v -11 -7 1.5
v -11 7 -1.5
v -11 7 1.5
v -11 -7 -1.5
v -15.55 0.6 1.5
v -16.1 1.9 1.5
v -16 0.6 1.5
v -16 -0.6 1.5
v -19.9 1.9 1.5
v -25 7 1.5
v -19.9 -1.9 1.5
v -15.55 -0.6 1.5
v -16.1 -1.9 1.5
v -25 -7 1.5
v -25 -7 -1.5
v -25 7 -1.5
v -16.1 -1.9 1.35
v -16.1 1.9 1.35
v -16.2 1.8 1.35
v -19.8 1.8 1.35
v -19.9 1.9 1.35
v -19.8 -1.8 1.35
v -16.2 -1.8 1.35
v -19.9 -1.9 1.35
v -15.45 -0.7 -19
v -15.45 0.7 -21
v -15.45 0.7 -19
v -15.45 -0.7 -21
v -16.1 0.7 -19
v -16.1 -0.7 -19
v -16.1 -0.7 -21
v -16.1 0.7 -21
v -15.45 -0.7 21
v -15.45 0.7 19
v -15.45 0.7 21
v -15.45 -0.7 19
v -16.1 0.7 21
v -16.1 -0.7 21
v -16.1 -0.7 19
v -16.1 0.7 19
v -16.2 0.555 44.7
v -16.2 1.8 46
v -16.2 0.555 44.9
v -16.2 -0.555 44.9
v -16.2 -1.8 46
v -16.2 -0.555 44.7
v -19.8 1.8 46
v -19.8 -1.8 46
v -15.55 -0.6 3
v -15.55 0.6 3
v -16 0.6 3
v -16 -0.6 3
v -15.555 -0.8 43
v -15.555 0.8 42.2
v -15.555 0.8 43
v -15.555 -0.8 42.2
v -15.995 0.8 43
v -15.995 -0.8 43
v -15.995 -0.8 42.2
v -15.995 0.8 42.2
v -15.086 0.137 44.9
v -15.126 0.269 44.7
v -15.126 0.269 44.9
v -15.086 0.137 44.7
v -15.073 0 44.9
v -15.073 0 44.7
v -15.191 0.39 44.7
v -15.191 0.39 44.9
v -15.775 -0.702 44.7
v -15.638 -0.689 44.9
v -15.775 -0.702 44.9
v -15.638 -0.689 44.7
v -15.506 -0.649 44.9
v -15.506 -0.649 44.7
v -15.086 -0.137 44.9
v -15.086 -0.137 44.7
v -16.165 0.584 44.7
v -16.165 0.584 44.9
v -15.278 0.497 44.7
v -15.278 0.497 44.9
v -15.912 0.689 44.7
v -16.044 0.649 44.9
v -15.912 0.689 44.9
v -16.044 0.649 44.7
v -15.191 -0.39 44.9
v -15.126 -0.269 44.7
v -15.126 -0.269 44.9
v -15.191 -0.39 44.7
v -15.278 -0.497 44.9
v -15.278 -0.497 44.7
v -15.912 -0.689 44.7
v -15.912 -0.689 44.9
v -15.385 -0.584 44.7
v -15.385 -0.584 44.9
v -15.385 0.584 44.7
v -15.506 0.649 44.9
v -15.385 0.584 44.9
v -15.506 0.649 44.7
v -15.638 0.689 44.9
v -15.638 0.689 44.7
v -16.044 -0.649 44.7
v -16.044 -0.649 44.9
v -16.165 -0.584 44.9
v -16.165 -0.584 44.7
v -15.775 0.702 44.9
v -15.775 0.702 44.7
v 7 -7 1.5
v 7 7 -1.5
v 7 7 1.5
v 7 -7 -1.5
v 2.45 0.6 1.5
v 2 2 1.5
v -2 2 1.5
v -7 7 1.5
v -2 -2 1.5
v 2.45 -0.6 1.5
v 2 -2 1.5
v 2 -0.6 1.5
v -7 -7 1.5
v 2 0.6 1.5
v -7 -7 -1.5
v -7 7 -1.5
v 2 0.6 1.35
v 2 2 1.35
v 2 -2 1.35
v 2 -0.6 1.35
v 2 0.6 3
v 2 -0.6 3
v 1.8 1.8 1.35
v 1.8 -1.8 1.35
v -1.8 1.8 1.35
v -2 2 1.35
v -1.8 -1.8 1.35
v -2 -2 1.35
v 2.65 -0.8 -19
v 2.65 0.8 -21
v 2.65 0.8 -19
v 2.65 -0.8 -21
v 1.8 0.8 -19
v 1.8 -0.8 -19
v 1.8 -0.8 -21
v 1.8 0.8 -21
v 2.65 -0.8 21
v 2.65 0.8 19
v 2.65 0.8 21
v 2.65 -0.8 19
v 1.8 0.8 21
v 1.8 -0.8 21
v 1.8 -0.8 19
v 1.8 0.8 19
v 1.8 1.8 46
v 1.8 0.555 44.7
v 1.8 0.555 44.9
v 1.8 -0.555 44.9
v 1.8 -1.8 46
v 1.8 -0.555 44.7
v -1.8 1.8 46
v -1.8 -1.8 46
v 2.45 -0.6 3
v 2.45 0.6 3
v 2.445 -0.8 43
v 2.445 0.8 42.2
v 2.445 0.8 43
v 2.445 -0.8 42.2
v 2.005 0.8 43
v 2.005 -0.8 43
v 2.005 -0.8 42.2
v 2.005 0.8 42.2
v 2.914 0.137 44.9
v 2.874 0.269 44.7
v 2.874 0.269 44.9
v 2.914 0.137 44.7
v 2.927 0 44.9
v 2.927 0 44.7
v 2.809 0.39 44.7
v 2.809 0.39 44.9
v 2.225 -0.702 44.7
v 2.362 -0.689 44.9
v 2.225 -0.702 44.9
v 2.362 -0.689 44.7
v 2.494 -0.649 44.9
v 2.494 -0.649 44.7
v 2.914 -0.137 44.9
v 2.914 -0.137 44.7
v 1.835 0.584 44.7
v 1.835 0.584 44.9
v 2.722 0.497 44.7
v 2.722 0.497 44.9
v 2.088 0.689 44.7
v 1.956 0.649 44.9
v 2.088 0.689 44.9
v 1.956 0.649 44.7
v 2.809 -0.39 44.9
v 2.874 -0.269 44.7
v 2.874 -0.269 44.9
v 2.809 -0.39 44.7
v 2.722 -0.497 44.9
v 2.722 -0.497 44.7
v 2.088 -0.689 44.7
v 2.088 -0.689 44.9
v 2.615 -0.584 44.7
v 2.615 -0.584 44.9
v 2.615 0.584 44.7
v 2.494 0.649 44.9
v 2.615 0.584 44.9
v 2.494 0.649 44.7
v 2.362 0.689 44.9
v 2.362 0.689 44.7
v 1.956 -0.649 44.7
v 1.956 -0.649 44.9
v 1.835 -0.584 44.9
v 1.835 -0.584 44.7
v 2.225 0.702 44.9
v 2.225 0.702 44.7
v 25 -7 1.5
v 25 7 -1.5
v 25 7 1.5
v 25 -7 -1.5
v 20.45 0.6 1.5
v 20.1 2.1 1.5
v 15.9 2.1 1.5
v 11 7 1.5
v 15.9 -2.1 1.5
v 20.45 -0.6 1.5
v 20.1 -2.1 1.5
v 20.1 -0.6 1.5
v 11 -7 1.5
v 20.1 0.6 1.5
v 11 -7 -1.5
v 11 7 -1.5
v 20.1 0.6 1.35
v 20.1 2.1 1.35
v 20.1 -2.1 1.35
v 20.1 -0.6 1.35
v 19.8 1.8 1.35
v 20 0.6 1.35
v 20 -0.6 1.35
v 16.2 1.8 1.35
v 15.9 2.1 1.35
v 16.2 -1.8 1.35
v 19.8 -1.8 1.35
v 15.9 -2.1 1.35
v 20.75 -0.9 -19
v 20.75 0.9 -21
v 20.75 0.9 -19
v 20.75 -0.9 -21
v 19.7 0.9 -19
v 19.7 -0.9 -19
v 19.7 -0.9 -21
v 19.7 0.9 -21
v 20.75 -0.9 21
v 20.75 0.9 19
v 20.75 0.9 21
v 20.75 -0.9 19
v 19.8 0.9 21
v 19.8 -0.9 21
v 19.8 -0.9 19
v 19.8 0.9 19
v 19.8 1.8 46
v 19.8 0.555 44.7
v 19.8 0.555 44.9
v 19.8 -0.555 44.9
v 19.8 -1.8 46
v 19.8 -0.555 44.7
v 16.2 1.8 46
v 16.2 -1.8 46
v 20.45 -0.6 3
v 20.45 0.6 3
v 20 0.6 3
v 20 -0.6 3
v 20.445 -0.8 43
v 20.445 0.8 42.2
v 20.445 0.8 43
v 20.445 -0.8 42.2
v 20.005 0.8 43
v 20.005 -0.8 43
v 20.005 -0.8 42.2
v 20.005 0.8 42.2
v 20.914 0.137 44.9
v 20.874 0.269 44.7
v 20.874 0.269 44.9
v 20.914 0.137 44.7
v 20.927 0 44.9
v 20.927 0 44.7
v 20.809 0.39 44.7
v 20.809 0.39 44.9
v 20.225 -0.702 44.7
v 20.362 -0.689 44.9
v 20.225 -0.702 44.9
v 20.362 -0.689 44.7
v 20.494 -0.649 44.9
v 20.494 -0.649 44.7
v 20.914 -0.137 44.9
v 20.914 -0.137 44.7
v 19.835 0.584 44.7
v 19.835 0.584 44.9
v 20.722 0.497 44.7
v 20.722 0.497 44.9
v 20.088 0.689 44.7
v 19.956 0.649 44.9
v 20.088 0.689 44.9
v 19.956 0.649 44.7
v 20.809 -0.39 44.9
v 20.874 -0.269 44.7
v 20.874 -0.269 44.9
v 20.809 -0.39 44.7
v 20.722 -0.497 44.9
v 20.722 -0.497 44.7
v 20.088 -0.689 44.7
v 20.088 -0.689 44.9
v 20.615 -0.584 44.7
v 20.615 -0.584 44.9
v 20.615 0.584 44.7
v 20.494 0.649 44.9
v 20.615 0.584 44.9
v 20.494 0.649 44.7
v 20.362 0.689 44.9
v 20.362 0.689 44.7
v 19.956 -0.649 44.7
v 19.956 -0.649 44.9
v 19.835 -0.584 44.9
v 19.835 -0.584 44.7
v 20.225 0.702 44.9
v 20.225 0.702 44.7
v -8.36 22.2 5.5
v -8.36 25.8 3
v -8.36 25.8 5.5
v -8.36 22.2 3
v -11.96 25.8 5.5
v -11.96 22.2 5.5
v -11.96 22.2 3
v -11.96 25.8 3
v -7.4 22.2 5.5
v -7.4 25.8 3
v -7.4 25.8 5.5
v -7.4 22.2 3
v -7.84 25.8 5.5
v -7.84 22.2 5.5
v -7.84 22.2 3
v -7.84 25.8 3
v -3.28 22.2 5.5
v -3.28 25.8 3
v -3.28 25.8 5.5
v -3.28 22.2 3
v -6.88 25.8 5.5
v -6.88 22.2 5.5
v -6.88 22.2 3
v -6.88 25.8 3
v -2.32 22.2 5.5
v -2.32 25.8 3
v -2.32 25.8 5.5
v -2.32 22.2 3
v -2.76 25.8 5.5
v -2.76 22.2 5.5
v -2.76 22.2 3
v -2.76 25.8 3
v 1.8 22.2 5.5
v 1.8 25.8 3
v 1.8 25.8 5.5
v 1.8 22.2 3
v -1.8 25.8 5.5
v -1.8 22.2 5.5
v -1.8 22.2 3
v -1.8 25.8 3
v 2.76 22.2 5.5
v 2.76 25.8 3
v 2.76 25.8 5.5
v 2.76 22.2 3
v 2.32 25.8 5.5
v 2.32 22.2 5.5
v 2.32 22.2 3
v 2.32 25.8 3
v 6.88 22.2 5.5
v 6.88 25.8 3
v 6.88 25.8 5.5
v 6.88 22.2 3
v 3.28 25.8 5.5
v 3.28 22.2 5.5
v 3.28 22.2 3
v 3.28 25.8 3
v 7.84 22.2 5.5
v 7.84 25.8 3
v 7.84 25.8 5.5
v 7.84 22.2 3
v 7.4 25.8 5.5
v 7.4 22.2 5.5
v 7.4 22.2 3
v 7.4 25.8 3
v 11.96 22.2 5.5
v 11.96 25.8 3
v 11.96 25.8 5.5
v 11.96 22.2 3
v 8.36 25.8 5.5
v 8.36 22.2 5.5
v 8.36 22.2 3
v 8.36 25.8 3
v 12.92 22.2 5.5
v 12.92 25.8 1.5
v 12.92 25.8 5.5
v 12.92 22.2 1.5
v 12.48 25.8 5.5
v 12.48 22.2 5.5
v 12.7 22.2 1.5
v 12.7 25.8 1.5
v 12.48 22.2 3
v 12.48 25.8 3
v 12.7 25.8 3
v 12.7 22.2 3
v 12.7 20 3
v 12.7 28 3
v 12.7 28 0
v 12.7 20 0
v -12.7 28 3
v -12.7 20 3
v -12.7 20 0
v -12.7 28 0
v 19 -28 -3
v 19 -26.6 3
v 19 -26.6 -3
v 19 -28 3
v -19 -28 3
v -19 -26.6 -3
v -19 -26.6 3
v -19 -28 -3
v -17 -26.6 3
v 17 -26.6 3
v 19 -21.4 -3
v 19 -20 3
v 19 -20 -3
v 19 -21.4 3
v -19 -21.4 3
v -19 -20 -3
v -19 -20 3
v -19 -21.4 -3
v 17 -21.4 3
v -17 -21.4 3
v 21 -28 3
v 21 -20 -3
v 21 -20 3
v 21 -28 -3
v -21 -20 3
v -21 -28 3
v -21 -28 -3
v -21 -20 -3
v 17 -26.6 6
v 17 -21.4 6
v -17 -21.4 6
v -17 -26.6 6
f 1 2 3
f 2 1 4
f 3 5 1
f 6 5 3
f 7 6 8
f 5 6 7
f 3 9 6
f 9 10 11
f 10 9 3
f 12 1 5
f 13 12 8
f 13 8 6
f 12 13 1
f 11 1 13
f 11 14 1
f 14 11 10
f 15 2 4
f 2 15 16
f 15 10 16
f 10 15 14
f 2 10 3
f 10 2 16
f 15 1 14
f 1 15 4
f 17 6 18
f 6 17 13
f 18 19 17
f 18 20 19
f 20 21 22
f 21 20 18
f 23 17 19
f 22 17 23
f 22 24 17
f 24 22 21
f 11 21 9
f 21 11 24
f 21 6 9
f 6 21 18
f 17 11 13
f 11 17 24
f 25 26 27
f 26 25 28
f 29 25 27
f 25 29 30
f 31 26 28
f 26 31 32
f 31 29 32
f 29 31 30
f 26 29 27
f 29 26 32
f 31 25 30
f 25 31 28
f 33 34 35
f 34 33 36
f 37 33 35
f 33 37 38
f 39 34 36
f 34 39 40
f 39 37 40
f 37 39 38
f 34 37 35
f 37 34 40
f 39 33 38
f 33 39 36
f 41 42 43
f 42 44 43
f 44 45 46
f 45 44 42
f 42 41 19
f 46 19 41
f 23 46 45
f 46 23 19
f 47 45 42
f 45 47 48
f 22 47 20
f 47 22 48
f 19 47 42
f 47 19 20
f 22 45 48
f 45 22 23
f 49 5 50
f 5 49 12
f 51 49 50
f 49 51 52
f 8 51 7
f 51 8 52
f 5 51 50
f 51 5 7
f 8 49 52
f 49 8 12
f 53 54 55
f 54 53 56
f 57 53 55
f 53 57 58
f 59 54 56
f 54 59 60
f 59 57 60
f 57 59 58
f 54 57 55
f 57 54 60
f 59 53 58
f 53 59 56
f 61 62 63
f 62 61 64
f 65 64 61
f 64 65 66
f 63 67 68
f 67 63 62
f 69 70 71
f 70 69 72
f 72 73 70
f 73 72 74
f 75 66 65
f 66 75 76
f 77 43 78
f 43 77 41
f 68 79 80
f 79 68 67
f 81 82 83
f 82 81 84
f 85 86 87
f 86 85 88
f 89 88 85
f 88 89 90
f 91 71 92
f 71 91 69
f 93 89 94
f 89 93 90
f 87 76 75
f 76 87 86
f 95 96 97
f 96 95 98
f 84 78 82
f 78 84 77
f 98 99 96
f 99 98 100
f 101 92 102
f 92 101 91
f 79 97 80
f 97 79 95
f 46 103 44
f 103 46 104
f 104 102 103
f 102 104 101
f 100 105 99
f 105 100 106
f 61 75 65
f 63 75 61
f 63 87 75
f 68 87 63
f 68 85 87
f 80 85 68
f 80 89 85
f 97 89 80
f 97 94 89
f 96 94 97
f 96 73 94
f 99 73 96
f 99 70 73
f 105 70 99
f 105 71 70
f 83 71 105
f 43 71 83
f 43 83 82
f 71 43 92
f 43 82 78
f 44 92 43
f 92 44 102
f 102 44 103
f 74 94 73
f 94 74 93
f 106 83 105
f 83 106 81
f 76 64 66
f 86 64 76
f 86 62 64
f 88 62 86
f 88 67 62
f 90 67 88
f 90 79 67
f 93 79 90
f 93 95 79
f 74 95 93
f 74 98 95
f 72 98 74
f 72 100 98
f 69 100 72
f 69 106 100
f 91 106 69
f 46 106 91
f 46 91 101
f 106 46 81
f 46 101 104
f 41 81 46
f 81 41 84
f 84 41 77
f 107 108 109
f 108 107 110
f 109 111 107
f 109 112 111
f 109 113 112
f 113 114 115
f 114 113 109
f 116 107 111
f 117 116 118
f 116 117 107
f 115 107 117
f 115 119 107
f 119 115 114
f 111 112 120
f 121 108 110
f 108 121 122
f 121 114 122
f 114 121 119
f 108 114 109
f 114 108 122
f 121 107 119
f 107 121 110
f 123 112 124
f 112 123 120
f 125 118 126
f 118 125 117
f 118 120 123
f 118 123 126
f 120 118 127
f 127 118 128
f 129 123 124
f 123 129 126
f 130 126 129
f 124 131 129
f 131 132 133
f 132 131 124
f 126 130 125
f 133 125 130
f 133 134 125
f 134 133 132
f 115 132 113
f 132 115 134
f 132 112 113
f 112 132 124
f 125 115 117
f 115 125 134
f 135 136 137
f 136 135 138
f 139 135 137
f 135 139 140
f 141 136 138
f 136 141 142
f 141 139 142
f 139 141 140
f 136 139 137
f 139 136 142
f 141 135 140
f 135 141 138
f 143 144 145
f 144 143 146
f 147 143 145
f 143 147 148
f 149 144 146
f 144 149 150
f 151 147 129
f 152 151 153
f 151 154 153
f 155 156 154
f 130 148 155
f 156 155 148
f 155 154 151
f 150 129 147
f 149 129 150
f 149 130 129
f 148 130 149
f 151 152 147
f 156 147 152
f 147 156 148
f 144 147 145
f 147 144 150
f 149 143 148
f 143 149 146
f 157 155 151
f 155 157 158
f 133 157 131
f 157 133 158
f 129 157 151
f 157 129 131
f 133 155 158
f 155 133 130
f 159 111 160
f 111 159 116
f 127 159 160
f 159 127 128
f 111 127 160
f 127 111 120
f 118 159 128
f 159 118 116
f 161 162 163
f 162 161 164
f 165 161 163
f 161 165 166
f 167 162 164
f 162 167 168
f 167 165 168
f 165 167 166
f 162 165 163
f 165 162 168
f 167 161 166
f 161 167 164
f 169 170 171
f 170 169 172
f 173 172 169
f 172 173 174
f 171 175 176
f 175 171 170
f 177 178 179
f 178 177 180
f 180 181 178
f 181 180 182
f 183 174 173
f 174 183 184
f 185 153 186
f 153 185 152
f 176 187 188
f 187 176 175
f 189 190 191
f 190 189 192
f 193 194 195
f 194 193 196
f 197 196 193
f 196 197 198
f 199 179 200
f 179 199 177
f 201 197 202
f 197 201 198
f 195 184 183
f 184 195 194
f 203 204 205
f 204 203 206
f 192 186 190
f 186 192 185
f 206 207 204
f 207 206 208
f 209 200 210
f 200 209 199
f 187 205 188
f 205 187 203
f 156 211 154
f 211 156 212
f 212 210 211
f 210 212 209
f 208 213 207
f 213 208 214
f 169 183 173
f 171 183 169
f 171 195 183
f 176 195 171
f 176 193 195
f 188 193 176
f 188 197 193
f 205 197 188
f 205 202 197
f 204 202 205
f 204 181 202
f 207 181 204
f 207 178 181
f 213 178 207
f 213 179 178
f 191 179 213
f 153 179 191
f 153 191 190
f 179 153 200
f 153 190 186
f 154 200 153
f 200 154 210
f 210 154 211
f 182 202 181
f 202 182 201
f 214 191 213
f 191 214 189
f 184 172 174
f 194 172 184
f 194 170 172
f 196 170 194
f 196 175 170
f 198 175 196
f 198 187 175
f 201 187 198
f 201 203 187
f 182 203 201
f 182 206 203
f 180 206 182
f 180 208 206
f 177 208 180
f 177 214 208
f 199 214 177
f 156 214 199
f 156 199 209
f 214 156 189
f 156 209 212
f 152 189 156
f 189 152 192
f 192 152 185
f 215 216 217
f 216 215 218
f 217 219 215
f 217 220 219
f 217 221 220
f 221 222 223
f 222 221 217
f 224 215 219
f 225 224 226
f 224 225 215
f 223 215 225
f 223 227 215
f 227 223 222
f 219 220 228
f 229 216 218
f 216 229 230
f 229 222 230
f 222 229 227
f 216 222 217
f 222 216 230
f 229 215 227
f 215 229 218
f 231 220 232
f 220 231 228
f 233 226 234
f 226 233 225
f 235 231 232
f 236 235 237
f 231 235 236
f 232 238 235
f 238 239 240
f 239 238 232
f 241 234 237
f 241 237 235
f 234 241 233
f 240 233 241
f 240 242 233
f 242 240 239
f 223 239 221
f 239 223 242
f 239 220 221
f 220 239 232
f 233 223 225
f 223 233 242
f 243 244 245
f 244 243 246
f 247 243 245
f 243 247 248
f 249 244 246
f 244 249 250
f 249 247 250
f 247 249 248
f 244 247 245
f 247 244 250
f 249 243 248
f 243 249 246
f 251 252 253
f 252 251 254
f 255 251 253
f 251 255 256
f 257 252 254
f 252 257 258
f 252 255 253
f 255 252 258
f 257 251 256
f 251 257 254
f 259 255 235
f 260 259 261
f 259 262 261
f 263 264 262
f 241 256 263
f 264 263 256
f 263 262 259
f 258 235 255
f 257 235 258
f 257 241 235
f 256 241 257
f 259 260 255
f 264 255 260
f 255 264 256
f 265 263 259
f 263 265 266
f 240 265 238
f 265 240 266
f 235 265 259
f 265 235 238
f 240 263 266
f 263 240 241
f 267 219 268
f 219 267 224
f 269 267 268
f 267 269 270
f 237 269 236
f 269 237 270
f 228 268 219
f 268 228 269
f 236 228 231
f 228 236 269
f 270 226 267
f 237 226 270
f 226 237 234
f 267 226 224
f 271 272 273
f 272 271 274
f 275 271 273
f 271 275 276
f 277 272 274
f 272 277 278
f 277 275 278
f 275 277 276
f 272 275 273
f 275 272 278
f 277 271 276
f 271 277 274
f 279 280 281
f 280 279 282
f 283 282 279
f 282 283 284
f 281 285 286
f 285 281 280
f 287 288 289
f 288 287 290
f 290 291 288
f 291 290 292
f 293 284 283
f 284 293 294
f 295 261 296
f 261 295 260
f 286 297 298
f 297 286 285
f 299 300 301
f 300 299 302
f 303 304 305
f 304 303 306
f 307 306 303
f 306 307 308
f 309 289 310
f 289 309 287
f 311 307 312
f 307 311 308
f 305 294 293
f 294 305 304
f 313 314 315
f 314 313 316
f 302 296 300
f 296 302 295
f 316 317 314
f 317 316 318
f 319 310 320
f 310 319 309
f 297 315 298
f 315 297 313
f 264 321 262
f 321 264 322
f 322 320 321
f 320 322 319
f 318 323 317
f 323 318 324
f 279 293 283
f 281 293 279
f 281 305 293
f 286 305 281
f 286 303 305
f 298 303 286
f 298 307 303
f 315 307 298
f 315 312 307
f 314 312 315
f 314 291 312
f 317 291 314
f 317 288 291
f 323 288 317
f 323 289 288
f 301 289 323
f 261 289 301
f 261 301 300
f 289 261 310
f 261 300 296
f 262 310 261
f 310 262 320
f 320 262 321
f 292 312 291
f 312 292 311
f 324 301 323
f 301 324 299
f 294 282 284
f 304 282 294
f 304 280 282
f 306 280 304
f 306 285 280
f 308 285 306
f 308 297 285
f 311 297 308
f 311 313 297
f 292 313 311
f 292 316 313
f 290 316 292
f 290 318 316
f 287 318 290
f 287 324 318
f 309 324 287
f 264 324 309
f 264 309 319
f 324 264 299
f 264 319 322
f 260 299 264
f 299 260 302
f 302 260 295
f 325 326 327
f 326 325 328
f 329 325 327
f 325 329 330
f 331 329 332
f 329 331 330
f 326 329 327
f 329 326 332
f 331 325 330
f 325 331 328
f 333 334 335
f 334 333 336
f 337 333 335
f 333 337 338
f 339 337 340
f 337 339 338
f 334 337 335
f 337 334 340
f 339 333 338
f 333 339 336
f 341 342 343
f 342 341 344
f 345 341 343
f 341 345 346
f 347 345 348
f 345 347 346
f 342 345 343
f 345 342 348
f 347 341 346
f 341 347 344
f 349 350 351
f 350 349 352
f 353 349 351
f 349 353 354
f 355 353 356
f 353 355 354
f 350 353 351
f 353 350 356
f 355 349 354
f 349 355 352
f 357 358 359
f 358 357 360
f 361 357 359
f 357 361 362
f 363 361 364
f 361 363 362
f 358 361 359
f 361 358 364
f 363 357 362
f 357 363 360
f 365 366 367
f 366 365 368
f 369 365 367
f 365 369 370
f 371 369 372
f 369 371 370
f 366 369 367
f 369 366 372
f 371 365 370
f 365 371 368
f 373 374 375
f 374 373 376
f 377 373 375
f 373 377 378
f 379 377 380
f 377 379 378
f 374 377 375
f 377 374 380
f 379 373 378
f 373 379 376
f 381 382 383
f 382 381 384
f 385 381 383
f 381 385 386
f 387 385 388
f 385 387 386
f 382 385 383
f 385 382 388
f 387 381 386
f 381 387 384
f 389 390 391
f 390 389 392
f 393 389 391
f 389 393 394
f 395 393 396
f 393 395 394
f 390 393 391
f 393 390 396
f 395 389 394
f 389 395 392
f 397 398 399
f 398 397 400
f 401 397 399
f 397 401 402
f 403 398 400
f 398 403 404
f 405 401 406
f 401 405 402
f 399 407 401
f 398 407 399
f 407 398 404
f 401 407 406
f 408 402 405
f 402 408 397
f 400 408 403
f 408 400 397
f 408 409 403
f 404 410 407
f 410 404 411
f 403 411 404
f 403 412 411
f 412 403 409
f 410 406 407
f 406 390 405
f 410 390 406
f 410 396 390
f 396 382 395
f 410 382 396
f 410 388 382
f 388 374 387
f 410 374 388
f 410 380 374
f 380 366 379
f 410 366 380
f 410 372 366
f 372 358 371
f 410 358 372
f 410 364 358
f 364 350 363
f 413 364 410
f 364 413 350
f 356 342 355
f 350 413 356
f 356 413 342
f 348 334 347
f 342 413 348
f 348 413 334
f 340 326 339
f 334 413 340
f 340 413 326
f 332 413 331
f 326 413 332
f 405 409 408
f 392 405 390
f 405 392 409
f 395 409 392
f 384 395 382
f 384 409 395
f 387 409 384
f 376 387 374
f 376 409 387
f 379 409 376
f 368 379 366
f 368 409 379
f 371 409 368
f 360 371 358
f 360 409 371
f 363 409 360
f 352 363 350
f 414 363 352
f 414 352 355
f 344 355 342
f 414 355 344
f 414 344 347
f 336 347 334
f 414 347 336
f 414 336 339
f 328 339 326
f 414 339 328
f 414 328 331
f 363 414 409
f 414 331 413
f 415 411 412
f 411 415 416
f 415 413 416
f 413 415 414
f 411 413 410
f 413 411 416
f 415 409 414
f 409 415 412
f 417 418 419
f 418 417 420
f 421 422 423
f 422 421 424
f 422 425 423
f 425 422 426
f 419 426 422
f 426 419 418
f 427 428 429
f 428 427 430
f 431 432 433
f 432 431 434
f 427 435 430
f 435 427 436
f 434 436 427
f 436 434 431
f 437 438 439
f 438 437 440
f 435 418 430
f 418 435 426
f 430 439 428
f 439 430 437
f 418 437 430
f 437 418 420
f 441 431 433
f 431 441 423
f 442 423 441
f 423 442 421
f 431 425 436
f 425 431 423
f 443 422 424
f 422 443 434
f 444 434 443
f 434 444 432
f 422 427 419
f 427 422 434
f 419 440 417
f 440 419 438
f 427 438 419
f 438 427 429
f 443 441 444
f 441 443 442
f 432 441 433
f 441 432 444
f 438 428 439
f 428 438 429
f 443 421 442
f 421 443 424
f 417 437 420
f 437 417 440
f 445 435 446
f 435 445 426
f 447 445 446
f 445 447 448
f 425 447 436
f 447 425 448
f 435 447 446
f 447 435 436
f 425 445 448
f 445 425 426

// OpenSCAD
// DES-003 / Q-009 critical-fit calibration coupon.
// Evidence class: CAD-derived/calculated only; no print or physical validation.
// Render: openscad -o a1_coupon_calibration.stl a1_coupon_calibration.scad
PITCH=5.08; BODY=3.60; CLEAR=0.20; LATCH_T=0.45; LATCH_W=1.20;
TRAVEL=40.0; FLAG_T=0.44; FLAG_W=1.60; FLAG_GAP=1.80;
SLIDE_W=8.0; SLIDE_L=42.0; SLIDE_H=6.0; SLIDE_RAIL=1.20; $fn=32;
OWNED_LANE=PITCH/2-BODY/2; HINGE_X=BODY/2+LATCH_T/2+CLEAR; FLAG_Z=TRAVEL+3.0;

// A: three actual binary-latch stations spanning the nominal clearance band.
module latch_station(c=CLEAR) {
  socket=BODY+2*c;
  difference(){ cube([14,14,3],center=true); translate([0,0,1.55]) cube([socket,socket,.4],center=true); }
  translate([0,0,23]) cube([BODY,BODY,46],center=true);
  translate([HINGE_X,0,1.5]) cube([LATCH_T,LATCH_W,3],center=true);
  for(z=[-TRAVEL/2,TRAVEL/2]) translate([HINGE_X,0,z]) cube([LATCH_T+2*c,LATCH_W+2*c,2],center=true);
  translate([HINGE_X,0,FLAG_Z-.4]) color("Gold") cube([FLAG_T,FLAG_W,.8],center=true);
  translate([HINGE_X,0,FLAG_Z+FLAG_GAP]) color("Orange",.35) cylinder(h=.2,d=FLAG_T+2*FLAG_GAP*tan(15),center=true);
}
module latch_band(){ for(i=[0:2]) translate([i*18-18,0,0]) latch_station(CLEAR+(i-1)*.1); }

// B: five true-pitch registration stations and half-pitch marks.
module registration_span(){
  translate([0,24,1.5]) cube([5*PITCH,8,3],center=true);
  for(i=[0:4]) { x=(i-2)*PITCH; translate([x,24,3.5]) cube([BODY,BODY,4],center=true); translate([x+PITCH/2,24,3.5]) cube([.44,BODY,4],center=true); }
}

// C: two-rail repeated-fit interface; clearance is intentionally adjustable.
module sliding_pair(c=CLEAR){
  difference(){ cube([SLIDE_L,SLIDE_W,SLIDE_H],center=true); for(y=[-SLIDE_W/2+SLIDE_RAIL/2,SLIDE_W/2-SLIDE_RAIL/2]) translate([0,y,0]) cube([SLIDE_L-4,SLIDE_RAIL+2*c,SLIDE_H+.2],center=true); }
  translate([0,0,SLIDE_H/2+1.5]) cube([SLIDE_L-8,SLIDE_W-2*SLIDE_RAIL-2*c,3],center=true);
}
module coupon(){ latch_band(); registration_span(); translate([0,-24,0]) sliding_pair(CLEAR); }
coupon();
echo(str("EVIDENCE=CAD-derived; physical_validation=unresolved"));
echo(str("PITCH=",PITCH," BODY=",BODY," CLEAR=",CLEAR," OWNED_LANE=",OWNED_LANE));
echo(str("LATCH_CLEAR_BAND=",CLEAR-.1,":",CLEAR+.1," FLAG_T=",FLAG_T));
echo(str("READER_FLAG_GAP=",FLAG_GAP," HALF_PITCH=",PITCH/2));
echo(str("SLIDE_CLEAR_BAND=",CLEAR-.1,":",CLEAR+.1," SLIDE_LENGTH=",SLIDE_L));
